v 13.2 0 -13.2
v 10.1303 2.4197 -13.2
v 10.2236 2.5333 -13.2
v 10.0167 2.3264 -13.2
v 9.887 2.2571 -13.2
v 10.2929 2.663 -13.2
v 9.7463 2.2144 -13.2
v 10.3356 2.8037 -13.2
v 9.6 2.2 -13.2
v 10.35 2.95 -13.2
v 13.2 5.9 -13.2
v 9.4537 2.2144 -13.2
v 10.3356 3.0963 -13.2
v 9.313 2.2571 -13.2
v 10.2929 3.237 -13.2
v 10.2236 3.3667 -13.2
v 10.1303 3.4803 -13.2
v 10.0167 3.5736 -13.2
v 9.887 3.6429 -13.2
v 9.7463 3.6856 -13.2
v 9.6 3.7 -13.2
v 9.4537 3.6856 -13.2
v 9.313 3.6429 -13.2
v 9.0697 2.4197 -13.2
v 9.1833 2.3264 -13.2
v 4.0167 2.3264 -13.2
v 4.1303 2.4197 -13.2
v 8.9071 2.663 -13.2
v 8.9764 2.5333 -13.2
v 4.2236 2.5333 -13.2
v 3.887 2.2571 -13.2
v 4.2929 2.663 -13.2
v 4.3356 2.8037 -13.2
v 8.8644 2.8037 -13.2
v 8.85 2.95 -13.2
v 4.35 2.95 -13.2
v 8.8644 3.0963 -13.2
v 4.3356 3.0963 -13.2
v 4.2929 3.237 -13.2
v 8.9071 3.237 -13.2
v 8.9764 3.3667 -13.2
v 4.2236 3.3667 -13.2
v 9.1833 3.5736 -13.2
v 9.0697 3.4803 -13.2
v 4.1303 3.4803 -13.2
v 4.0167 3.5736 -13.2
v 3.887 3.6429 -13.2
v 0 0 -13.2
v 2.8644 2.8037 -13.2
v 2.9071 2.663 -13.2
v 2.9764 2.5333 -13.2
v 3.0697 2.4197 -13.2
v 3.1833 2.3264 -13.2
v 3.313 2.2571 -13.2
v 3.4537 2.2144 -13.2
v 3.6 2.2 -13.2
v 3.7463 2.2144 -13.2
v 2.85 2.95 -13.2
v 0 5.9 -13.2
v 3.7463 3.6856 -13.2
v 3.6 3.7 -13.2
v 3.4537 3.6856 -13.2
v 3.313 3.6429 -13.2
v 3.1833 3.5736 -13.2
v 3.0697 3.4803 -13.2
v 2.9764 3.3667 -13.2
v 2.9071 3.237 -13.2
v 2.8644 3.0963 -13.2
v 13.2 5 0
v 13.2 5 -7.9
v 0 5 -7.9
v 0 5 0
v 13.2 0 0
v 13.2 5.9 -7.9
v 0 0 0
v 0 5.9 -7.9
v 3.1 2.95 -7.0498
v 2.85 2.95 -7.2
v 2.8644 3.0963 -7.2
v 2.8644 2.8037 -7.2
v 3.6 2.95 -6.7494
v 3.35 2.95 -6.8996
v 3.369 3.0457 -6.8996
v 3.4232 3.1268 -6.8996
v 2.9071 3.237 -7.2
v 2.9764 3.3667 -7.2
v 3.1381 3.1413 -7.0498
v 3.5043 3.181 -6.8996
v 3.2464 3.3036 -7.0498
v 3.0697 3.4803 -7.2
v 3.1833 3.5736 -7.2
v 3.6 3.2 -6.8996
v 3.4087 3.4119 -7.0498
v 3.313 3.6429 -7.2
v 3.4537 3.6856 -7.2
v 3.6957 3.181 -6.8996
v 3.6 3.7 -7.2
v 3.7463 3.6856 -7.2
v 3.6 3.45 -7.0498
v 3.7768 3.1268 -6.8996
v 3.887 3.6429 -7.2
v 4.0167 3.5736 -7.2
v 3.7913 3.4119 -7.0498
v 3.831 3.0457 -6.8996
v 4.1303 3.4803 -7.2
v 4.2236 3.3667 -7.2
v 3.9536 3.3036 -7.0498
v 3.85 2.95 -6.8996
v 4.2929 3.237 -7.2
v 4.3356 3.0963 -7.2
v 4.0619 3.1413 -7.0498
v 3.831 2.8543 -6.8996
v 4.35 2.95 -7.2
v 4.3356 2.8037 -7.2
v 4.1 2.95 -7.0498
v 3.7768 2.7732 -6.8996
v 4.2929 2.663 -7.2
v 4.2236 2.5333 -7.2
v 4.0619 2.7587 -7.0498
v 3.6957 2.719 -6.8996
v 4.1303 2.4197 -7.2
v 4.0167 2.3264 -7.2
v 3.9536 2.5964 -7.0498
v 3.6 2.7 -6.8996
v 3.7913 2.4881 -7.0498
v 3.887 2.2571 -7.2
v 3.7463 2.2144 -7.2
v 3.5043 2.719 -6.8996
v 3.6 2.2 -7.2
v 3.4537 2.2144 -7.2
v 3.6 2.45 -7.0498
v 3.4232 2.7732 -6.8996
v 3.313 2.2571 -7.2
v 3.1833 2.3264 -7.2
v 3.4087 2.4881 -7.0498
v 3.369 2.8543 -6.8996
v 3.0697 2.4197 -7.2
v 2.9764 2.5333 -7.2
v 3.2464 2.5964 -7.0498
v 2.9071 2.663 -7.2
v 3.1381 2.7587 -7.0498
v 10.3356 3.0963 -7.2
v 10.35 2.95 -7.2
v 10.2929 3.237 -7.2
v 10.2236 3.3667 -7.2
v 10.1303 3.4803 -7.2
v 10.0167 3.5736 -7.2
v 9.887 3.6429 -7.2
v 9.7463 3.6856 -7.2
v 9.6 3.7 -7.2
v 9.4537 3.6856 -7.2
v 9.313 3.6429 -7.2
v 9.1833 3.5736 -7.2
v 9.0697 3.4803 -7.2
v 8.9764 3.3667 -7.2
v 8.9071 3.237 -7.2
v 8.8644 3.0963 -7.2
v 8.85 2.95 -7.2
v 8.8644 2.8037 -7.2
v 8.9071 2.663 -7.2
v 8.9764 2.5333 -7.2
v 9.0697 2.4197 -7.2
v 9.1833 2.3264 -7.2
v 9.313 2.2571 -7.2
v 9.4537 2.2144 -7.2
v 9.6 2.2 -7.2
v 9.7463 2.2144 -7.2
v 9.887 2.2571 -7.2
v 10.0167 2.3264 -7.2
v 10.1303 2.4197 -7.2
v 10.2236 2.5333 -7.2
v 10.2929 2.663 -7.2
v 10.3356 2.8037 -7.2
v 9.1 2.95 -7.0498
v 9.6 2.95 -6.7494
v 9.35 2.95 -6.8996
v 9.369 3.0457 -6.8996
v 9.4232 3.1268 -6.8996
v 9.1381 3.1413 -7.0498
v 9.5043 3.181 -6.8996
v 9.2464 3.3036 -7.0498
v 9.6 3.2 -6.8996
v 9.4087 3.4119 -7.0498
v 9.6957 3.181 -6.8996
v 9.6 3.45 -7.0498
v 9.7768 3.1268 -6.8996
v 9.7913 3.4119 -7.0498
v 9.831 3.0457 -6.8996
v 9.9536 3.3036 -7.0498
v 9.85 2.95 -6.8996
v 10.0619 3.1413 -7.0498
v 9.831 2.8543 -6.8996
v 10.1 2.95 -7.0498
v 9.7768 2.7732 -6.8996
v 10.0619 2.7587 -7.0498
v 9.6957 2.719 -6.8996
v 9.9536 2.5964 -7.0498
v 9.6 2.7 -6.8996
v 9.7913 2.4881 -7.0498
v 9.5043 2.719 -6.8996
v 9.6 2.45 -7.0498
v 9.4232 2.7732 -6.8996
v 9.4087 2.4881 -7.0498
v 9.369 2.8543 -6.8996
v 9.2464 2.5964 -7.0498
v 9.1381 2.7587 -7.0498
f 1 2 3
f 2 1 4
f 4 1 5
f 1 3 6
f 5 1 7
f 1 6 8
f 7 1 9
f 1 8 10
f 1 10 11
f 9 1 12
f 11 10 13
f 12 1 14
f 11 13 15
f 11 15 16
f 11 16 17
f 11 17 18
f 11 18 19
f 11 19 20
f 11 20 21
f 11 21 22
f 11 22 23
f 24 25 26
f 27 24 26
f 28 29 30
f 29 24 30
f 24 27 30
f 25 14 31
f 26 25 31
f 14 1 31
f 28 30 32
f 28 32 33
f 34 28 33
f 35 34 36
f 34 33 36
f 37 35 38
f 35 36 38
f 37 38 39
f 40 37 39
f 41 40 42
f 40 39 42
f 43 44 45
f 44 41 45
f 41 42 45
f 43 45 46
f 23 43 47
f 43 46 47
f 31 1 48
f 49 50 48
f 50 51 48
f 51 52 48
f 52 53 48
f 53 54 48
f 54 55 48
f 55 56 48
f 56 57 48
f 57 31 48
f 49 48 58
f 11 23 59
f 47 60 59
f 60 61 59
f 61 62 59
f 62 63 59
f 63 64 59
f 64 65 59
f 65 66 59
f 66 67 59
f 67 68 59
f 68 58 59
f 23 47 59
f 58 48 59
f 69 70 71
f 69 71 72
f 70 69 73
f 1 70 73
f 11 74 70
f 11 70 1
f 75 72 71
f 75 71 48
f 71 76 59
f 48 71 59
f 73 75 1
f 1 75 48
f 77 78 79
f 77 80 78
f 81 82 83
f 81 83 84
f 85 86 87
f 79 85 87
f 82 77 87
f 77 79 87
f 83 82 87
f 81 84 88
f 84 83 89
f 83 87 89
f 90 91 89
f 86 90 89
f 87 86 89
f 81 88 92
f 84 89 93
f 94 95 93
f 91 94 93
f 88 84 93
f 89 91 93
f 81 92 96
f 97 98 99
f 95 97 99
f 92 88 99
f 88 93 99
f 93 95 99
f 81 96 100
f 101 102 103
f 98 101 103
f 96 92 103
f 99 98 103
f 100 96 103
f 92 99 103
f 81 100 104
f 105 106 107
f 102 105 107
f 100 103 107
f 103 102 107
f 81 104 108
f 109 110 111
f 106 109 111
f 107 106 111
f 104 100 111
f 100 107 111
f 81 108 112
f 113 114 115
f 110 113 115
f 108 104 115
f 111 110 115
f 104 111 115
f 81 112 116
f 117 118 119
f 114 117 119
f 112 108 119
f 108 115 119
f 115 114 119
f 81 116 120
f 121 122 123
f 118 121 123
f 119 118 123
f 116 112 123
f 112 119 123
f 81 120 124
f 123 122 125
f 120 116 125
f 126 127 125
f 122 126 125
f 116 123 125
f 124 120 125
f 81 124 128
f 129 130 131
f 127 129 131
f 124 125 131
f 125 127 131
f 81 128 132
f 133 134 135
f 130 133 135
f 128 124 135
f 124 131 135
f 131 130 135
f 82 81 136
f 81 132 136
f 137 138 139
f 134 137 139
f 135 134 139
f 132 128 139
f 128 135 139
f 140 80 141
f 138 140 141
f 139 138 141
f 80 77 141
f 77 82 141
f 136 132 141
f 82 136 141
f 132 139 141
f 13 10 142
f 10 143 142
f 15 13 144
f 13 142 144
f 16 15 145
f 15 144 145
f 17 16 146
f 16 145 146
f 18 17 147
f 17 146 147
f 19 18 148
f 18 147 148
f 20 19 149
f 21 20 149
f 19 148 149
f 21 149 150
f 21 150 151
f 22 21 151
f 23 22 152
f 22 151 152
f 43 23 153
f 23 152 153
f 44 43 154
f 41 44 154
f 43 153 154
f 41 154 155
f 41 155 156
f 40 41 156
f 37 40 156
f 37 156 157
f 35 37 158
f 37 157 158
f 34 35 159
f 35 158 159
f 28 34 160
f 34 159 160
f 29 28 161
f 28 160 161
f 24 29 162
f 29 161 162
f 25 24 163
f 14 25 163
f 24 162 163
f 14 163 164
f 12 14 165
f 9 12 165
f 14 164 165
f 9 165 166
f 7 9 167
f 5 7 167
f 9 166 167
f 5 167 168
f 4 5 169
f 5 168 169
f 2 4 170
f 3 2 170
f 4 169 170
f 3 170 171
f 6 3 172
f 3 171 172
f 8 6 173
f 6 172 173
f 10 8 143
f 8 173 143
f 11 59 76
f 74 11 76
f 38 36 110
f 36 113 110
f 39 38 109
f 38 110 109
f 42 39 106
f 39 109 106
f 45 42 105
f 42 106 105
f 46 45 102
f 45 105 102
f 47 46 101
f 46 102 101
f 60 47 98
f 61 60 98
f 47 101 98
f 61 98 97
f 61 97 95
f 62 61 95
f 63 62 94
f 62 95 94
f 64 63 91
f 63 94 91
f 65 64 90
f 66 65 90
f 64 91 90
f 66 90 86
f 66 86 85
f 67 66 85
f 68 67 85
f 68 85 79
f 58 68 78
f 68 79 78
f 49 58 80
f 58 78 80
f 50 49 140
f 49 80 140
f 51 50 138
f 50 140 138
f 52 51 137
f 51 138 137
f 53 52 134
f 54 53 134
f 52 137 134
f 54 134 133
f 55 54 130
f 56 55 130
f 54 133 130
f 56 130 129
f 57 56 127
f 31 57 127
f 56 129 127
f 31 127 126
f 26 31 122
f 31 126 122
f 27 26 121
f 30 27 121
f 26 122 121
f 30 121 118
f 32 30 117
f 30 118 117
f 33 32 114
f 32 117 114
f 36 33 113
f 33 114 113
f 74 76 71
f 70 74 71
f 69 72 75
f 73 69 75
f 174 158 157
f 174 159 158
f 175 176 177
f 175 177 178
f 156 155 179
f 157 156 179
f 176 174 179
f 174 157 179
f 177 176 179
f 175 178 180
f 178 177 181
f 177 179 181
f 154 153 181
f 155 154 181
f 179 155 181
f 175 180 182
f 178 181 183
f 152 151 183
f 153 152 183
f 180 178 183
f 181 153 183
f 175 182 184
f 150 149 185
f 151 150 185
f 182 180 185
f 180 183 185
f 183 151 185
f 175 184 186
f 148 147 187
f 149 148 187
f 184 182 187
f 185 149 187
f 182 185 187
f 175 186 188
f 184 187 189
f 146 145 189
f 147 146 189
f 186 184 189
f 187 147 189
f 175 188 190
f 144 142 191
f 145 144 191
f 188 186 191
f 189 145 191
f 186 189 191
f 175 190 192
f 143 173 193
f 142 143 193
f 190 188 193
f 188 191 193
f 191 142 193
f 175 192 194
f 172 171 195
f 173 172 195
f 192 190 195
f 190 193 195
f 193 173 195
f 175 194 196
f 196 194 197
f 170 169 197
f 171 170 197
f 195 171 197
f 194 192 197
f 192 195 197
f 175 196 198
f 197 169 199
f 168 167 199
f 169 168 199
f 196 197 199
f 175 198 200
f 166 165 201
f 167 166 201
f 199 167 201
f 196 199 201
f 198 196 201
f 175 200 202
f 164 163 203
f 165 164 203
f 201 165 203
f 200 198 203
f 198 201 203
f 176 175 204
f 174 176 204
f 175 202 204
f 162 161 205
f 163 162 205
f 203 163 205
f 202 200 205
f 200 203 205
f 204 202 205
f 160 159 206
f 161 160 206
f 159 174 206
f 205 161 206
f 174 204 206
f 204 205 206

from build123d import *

# Parameters (mm, degrees)
BOSS_EXTRUDE1_DEPTH       = 13.2
F_1_5MM_DOWEL_HOLE1_D     = 1.5
F_1_5MM_DOWEL_HOLE1_DEPTH = 6
F_1_5MM_DOWEL_HOLE1_TIP   = 0.450645464
F_1_5MM_DOWEL_HOLE7_D     = 1.5
F_1_5MM_DOWEL_HOLE7_DEPTH = 6
F_1_5MM_DOWEL_HOLE7_TIP   = 0.450645464


with BuildPart() as part:
    # Sketch3 → Boss-Extrude1 (new body)
    with BuildSketch(Plane(origin=(0, 0, 0), x_dir=(0, 0, -1), z_dir=(1, 0, 0))):
        Polygon((0, 0), (13.2, 0), (13.2, 5), (13.2, 5.9), (7.9, 5.9), (7.9, 5), (0, 5), align=None)
    extrude(amount=BOSS_EXTRUDE1_DEPTH)

    # Ø1.5mm Dowel Hole1
    with Locations(Plane(origin=(0, 0, -13.2), x_dir=(-1, 0, 0), z_dir=(0, 0, -1))):
        with Locations((-3.6, 2.95)):
            Hole(F_1_5MM_DOWEL_HOLE1_D / 2, depth=F_1_5MM_DOWEL_HOLE1_DEPTH)
            with Locations((0, 0, -(F_1_5MM_DOWEL_HOLE1_DEPTH + F_1_5MM_DOWEL_HOLE1_TIP / 2))):  # 118° drill point
                Cone(0, F_1_5MM_DOWEL_HOLE1_D / 2, F_1_5MM_DOWEL_HOLE1_TIP, mode=Mode.SUBTRACT)

    # Ø1.5mm Dowel Hole7
    with Locations(Plane(origin=(0, 0, -13.2), x_dir=(-1, 0, 0), z_dir=(0, 0, -1))):
        with Locations((-9.6, 2.95)):
            Hole(F_1_5MM_DOWEL_HOLE7_D / 2, depth=F_1_5MM_DOWEL_HOLE7_DEPTH)
            with Locations((0, 0, -(F_1_5MM_DOWEL_HOLE7_DEPTH + F_1_5MM_DOWEL_HOLE7_TIP / 2))):  # 118° drill point
                Cone(0, F_1_5MM_DOWEL_HOLE7_D / 2, F_1_5MM_DOWEL_HOLE7_TIP, mode=Mode.SUBTRACT)


solid = part.part
